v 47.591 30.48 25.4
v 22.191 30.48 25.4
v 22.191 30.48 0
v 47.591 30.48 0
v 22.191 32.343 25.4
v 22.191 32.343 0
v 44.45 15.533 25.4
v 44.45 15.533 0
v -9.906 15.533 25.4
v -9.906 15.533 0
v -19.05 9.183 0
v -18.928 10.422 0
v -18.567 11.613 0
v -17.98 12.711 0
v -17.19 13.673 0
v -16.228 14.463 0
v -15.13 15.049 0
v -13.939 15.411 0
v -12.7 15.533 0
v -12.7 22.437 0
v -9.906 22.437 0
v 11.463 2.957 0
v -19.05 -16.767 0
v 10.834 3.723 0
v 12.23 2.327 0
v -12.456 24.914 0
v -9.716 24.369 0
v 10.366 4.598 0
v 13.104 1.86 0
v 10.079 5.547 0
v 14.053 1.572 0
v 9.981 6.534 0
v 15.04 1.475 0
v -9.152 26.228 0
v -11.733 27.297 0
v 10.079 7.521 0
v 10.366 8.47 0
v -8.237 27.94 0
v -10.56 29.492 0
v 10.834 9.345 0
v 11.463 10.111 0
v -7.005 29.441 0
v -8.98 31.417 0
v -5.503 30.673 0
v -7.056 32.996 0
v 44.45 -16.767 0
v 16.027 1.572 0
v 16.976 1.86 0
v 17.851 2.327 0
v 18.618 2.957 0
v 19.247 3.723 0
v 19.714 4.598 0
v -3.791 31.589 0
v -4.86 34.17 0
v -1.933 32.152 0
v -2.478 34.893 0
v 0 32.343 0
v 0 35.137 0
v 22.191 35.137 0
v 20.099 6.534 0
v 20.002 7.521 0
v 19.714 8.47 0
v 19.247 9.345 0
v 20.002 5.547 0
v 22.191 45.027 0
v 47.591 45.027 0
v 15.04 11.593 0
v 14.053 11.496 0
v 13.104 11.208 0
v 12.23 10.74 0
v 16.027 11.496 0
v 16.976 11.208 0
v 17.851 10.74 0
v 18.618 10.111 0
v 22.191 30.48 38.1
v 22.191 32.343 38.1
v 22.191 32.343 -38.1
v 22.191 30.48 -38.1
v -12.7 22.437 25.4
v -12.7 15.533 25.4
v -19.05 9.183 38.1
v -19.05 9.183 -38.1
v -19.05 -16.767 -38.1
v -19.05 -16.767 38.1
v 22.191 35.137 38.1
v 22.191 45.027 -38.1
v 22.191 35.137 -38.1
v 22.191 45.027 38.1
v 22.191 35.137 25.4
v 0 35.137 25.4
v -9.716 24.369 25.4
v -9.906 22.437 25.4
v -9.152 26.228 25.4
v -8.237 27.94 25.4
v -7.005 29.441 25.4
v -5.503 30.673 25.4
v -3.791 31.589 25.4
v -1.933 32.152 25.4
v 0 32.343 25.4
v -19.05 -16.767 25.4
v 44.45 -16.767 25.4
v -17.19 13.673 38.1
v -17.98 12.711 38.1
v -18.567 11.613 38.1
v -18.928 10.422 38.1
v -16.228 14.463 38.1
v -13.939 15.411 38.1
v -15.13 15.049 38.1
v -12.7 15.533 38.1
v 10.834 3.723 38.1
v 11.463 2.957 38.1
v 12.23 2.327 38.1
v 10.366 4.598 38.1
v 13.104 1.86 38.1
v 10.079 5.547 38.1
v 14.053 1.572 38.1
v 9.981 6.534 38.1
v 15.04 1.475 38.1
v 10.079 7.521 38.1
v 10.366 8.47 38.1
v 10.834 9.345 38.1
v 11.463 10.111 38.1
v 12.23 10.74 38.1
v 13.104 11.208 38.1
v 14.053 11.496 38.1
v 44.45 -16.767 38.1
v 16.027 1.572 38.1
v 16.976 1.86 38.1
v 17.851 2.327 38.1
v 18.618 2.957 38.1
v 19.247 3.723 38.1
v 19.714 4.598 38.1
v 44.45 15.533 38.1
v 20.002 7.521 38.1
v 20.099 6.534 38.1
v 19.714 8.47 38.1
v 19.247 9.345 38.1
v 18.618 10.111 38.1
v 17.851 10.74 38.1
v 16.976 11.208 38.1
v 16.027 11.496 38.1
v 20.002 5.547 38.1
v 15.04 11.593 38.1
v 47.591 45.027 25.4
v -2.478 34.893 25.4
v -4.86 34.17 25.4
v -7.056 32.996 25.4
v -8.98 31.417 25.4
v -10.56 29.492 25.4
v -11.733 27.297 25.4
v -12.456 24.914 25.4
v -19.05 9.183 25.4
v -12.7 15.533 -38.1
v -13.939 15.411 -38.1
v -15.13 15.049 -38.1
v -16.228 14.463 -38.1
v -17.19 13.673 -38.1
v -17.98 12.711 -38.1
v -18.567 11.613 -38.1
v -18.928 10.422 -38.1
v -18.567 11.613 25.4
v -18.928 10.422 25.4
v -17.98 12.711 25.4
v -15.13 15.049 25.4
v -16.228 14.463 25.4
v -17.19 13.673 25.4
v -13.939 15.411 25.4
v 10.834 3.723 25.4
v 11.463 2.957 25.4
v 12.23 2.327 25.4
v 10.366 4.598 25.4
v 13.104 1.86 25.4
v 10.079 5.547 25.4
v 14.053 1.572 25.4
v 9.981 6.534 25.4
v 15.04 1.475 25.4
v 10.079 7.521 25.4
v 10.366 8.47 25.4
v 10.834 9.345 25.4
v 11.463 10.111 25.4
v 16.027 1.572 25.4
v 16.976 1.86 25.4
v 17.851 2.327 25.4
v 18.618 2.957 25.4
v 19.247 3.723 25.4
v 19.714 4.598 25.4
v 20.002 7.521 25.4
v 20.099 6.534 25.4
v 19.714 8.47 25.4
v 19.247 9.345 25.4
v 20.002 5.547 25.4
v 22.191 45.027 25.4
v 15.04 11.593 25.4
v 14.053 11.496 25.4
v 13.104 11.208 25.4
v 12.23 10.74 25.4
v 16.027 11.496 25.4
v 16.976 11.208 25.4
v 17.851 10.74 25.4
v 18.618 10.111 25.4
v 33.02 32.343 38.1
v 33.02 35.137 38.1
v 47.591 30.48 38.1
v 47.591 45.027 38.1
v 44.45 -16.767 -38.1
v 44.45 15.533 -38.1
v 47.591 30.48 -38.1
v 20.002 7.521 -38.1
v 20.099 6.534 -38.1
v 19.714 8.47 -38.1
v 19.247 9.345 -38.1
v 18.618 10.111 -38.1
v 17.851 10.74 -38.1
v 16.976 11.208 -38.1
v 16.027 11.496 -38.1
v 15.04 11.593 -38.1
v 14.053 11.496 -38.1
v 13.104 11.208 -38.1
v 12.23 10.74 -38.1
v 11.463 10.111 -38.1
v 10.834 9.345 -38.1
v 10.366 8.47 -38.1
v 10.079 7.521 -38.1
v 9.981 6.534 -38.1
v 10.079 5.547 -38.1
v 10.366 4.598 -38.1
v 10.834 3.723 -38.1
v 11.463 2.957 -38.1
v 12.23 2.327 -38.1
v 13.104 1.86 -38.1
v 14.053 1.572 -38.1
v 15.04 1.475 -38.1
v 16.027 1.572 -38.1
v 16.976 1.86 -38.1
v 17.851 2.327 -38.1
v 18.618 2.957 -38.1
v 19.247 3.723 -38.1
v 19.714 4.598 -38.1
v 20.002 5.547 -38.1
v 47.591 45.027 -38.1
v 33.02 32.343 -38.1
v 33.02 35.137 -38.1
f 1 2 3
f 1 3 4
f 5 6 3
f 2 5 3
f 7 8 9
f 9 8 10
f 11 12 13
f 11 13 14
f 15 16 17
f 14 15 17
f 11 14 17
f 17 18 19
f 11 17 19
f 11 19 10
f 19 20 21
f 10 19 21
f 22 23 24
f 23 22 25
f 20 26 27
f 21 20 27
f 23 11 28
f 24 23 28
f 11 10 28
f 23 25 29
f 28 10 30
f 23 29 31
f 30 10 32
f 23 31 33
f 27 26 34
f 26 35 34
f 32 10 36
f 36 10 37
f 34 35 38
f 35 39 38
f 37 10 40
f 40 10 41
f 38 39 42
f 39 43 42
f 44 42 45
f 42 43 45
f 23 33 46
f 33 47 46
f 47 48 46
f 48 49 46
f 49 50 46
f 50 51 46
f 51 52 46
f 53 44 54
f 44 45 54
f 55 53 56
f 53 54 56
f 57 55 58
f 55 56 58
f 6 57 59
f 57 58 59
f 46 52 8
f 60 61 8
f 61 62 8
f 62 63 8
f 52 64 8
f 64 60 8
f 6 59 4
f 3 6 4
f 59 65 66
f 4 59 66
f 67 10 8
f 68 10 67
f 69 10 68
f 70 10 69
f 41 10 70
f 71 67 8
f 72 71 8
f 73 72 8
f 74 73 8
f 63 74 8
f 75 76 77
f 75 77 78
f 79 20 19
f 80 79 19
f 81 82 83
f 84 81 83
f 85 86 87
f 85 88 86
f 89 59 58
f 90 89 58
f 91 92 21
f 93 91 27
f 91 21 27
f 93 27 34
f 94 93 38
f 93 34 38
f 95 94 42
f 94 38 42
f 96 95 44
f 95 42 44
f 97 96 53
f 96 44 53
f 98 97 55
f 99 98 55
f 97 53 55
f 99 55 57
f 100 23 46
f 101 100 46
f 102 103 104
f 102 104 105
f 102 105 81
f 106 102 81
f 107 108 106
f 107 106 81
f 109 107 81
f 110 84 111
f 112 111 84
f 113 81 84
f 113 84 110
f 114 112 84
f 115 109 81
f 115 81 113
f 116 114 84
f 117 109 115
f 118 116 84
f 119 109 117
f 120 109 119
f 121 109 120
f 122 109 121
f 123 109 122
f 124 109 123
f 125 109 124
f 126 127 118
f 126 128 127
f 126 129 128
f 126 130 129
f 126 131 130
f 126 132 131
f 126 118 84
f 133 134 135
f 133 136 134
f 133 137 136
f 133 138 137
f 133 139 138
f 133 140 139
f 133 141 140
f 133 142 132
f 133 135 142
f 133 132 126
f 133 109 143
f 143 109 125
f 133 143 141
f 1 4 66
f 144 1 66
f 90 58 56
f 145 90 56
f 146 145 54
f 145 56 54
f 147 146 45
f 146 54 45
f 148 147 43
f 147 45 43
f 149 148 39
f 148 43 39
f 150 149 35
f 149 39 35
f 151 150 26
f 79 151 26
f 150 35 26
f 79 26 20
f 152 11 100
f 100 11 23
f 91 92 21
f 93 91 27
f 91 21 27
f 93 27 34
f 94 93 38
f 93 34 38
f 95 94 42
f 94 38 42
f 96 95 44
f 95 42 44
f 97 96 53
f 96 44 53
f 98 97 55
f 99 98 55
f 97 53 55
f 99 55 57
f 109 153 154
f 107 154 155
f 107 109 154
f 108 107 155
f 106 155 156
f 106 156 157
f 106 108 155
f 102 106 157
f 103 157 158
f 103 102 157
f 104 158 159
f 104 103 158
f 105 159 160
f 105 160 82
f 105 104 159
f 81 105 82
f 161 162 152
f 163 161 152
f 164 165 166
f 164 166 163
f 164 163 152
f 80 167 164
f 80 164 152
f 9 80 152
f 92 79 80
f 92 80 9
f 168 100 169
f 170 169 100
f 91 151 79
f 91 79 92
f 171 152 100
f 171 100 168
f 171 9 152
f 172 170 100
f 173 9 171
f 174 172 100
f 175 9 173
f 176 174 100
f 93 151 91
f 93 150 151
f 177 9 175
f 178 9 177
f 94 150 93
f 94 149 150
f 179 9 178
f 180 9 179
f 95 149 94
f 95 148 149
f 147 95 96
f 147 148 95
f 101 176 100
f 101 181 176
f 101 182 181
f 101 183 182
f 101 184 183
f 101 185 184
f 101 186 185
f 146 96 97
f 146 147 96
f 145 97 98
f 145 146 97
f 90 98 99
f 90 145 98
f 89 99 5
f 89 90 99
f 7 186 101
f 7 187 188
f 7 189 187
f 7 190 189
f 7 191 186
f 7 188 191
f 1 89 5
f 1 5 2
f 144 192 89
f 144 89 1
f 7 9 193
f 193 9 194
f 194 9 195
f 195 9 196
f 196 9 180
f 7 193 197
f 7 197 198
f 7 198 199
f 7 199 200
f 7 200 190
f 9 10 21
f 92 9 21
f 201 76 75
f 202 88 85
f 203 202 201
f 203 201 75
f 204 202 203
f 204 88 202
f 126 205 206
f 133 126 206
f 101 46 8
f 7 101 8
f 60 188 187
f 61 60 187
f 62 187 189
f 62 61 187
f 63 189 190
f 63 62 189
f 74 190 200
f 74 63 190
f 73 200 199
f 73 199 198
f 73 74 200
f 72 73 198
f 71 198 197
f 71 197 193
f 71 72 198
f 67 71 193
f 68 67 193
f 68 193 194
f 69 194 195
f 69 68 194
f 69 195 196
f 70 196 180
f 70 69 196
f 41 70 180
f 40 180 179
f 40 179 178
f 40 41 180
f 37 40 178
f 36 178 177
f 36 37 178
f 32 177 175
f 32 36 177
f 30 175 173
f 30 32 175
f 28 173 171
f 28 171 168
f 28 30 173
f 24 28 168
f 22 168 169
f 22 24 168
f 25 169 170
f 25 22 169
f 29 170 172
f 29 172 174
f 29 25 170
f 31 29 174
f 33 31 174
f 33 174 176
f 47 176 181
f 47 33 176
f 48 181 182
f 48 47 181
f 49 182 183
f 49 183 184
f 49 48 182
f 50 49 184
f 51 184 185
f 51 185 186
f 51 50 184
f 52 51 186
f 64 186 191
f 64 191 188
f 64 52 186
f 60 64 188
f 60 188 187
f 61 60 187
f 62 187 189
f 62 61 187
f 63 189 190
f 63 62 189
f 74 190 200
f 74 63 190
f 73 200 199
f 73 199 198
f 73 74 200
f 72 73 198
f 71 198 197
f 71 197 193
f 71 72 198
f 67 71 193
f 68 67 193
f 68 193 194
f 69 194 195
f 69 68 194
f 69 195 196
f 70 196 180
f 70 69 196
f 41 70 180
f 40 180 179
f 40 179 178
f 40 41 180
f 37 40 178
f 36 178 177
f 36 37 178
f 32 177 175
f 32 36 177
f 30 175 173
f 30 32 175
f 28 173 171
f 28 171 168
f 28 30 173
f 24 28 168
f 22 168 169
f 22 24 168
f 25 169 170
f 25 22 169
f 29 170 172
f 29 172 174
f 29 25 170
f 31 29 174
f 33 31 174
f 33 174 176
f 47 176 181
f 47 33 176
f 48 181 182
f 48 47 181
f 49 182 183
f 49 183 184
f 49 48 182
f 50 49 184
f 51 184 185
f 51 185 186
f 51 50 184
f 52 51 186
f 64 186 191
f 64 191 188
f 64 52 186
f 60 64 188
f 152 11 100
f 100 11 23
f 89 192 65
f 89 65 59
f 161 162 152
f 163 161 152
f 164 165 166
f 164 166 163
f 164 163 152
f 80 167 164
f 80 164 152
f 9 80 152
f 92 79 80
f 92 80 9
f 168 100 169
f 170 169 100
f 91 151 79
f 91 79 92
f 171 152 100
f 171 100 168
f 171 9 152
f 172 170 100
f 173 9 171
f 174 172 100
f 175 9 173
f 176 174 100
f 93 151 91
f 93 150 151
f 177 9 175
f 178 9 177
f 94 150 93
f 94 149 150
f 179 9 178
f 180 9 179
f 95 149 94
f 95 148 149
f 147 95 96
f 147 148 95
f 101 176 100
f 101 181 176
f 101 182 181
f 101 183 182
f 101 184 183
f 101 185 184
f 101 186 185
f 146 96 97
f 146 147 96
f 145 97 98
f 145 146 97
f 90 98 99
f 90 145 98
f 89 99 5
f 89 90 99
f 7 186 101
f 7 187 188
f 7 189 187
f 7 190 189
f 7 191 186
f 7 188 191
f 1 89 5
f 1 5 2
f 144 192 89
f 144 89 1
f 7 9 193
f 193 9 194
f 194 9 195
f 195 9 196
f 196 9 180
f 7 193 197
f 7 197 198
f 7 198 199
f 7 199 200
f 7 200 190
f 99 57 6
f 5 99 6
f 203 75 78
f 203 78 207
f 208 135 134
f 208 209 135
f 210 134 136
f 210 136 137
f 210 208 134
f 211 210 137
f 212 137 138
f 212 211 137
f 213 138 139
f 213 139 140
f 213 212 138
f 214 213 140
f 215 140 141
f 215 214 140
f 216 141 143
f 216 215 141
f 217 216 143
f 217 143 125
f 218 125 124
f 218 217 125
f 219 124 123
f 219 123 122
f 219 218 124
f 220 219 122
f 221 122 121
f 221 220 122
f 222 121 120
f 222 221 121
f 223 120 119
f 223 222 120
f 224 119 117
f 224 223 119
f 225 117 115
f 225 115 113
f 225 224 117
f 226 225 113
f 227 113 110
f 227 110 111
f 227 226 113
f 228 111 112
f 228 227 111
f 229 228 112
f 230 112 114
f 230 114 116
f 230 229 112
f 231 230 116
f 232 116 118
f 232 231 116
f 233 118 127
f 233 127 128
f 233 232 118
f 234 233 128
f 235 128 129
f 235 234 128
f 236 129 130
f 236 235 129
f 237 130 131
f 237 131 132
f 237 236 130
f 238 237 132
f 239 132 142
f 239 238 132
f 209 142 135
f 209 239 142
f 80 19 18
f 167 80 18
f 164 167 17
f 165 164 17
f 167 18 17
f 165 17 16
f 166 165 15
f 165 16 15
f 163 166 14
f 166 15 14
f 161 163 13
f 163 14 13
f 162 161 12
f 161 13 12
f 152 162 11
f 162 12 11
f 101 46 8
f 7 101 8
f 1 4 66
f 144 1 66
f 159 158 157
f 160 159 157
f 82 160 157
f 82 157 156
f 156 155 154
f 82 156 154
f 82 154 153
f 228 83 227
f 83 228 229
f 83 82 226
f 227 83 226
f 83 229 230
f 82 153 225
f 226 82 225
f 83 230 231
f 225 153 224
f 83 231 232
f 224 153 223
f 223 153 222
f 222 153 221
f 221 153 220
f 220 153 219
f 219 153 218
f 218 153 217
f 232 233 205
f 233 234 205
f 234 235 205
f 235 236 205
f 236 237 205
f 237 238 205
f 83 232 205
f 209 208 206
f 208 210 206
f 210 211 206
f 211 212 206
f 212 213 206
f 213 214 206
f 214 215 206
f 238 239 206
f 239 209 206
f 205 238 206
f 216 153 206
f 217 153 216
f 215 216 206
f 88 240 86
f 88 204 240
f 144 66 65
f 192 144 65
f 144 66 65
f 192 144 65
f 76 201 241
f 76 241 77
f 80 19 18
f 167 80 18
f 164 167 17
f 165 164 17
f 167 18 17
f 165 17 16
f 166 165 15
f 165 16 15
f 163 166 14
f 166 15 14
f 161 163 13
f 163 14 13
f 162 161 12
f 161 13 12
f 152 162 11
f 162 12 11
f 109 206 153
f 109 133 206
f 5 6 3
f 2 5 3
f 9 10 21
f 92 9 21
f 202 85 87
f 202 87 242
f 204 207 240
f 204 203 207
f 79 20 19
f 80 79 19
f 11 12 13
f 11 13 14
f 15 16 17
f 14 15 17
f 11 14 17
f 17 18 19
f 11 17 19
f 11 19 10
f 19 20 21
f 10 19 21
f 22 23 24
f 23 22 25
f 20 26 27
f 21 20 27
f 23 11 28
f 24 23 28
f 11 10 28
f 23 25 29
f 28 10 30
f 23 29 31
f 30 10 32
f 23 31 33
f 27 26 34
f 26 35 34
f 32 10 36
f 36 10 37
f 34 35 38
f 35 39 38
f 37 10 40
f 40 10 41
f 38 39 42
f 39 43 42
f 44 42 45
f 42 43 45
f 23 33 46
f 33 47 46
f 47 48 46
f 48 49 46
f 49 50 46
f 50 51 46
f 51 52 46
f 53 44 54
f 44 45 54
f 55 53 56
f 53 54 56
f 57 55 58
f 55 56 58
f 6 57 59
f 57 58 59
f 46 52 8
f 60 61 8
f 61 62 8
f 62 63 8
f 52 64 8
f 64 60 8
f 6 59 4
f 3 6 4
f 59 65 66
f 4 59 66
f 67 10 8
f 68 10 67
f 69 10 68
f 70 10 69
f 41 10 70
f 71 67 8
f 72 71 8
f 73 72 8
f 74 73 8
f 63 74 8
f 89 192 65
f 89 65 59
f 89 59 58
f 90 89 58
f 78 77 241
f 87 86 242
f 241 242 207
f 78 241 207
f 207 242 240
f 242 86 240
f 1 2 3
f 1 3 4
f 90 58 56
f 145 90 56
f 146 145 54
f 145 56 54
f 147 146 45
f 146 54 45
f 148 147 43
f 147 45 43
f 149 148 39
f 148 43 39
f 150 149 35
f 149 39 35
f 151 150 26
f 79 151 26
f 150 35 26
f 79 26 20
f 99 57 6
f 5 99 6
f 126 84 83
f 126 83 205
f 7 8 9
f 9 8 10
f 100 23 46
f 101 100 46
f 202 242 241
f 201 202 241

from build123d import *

# Parameters (mm, degrees)
F0_R     = 5.0590675923
F1_DEPTH = 38.1
F0_W     = 10.8292447668
F0_H     = 2.7940001507
F2_DEPTH = 25.4
F3_DEPTH = 25.4


with BuildPart() as f1:
    # F0 (on Top) → F1 (new body, symmetric)
    with BuildSketch(Plane.XY):
        with BuildLine():
            Line((-9.9059998493, 15.5328589049), (-12.7, 15.5328589049))
            ThreePointArc((-12.7, 15.5328589049), (-17.1901280605, 13.6729869654), (-19.05, 9.1828589049))
            Line((-19.05, 9.1828589049), (-19.05, -16.7670173082))
            Line((-19.05, -16.7670173082), (44.45, -16.7670173082))
            Line((44.45, -16.7670173082), (44.45, 15.5328589049))
            Line((44.45, 15.5328589049), (-9.9059998493, 15.5328589049))
        make_face()
        with Locations((15.0403995067, 6.5339445136)):
            Circle(F0_R, mode=Mode.SUBTRACT)
    extrude(amount=F1_DEPTH, both=True)


with BuildPart() as f1b:
    # F0 (on Top) → F1, piece 2 (new body, symmetric)
    with BuildSketch(Plane.XY):
        Polygon((22.1907552332, 45.0272753793), (22.1907552332, 35.136650705), (33.02, 35.136650705), (33.02, 32.3426505543), (22.1907552332, 32.3426505543), (22.1907552332, 30.48), (47.5907552332, 30.48), (47.5907552332, 45.0272753793), align=None)
    extrude(amount=F1_DEPTH, both=True)


with BuildPart() as f2:
    # F0 (on Top) → F2 (new body)
    with BuildSketch(Plane.XY):
        with BuildLine():
            Line((-12.7, 22.436650705), (-12.7, 15.5328589049))
            Line((-12.7, 15.5328589049), (-9.9059998493, 15.5328589049))
            Line((-9.9059998493, 15.5328589049), (-9.9059998493, 22.436650705))
            ThreePointArc((-9.9059998493, 22.436650705), (-7.0045996679, 29.4412503729), (0, 32.3426505543))
            Line((0, 32.3426505543), (22.1907552332, 32.3426505543))
            Line((22.1907552332, 32.3426505543), (22.1907552332, 35.136650705))
            Line((22.1907552332, 35.136650705), (0, 35.136650705))
            ThreePointArc((0, 35.136650705), (-8.9802561211, 31.4169068261), (-12.7, 22.436650705))
        make_face()
        with BuildLine():
            Line((-9.9059998493, 15.5328589049), (-12.7, 15.5328589049))
            ThreePointArc((-12.7, 15.5328589049), (-17.1901280605, 13.6729869654), (-19.05, 9.1828589049))
            Line((-19.05, 9.1828589049), (-19.05, -16.7670173082))
            Line((-19.05, -16.7670173082), (44.45, -16.7670173082))
            Line((44.45, -16.7670173082), (44.45, 15.5328589049))
            Line((44.45, 15.5328589049), (-9.9059998493, 15.5328589049))
        make_face()
        with Locations((15.0403995067, 6.5339445136)):
            Circle(F0_R, mode=Mode.SUBTRACT)
        with Locations((27.6053776166, 33.7396506297)):
            Rectangle(F0_W, F0_H)
        Polygon((22.1907552332, 45.0272753793), (22.1907552332, 35.136650705), (33.02, 35.136650705), (33.02, 32.3426505543), (22.1907552332, 32.3426505543), (22.1907552332, 30.48), (47.5907552332, 30.48), (47.5907552332, 45.0272753793), align=None)
    extrude(amount=F2_DEPTH)


with BuildPart() as f3:
    # F0 (on Top) → F3 (new body)
    with BuildSketch(Plane.XY):
        with BuildLine():
            Line((-12.7, 22.436650705), (-12.7, 15.5328589049))
            Line((-12.7, 15.5328589049), (-9.9059998493, 15.5328589049))
            Line((-9.9059998493, 15.5328589049), (-9.9059998493, 22.436650705))
            ThreePointArc((-9.9059998493, 22.436650705), (-7.0045996679, 29.4412503729), (0, 32.3426505543))
            Line((0, 32.3426505543), (22.1907552332, 32.3426505543))
            Line((22.1907552332, 32.3426505543), (22.1907552332, 35.136650705))
            Line((22.1907552332, 35.136650705), (0, 35.136650705))
            ThreePointArc((0, 35.136650705), (-8.9802561211, 31.4169068261), (-12.7, 22.436650705))
        make_face()
        with BuildLine():
            Line((-9.9059998493, 15.5328589049), (-12.7, 15.5328589049))
            ThreePointArc((-12.7, 15.5328589049), (-17.1901280605, 13.6729869654), (-19.05, 9.1828589049))
            Line((-19.05, 9.1828589049), (-19.05, -16.7670173082))
            Line((-19.05, -16.7670173082), (44.45, -16.7670173082))
            Line((44.45, -16.7670173082), (44.45, 15.5328589049))
            Line((44.45, 15.5328589049), (-9.9059998493, 15.5328589049))
        make_face()
        with Locations((15.0403995067, 6.5339445136)):
            Circle(F0_R, mode=Mode.SUBTRACT)
        with Locations((27.6053776166, 33.7396506297)):
            Rectangle(F0_W, F0_H)
        Polygon((22.1907552332, 45.0272753793), (22.1907552332, 35.136650705), (33.02, 35.136650705), (33.02, 32.3426505543), (22.1907552332, 32.3426505543), (22.1907552332, 30.48), (47.5907552332, 30.48), (47.5907552332, 45.0272753793), align=None)
    extrude(amount=F3_DEPTH)


solid = Compound([f1.part, f1b.part, f2.part, f3.part])
